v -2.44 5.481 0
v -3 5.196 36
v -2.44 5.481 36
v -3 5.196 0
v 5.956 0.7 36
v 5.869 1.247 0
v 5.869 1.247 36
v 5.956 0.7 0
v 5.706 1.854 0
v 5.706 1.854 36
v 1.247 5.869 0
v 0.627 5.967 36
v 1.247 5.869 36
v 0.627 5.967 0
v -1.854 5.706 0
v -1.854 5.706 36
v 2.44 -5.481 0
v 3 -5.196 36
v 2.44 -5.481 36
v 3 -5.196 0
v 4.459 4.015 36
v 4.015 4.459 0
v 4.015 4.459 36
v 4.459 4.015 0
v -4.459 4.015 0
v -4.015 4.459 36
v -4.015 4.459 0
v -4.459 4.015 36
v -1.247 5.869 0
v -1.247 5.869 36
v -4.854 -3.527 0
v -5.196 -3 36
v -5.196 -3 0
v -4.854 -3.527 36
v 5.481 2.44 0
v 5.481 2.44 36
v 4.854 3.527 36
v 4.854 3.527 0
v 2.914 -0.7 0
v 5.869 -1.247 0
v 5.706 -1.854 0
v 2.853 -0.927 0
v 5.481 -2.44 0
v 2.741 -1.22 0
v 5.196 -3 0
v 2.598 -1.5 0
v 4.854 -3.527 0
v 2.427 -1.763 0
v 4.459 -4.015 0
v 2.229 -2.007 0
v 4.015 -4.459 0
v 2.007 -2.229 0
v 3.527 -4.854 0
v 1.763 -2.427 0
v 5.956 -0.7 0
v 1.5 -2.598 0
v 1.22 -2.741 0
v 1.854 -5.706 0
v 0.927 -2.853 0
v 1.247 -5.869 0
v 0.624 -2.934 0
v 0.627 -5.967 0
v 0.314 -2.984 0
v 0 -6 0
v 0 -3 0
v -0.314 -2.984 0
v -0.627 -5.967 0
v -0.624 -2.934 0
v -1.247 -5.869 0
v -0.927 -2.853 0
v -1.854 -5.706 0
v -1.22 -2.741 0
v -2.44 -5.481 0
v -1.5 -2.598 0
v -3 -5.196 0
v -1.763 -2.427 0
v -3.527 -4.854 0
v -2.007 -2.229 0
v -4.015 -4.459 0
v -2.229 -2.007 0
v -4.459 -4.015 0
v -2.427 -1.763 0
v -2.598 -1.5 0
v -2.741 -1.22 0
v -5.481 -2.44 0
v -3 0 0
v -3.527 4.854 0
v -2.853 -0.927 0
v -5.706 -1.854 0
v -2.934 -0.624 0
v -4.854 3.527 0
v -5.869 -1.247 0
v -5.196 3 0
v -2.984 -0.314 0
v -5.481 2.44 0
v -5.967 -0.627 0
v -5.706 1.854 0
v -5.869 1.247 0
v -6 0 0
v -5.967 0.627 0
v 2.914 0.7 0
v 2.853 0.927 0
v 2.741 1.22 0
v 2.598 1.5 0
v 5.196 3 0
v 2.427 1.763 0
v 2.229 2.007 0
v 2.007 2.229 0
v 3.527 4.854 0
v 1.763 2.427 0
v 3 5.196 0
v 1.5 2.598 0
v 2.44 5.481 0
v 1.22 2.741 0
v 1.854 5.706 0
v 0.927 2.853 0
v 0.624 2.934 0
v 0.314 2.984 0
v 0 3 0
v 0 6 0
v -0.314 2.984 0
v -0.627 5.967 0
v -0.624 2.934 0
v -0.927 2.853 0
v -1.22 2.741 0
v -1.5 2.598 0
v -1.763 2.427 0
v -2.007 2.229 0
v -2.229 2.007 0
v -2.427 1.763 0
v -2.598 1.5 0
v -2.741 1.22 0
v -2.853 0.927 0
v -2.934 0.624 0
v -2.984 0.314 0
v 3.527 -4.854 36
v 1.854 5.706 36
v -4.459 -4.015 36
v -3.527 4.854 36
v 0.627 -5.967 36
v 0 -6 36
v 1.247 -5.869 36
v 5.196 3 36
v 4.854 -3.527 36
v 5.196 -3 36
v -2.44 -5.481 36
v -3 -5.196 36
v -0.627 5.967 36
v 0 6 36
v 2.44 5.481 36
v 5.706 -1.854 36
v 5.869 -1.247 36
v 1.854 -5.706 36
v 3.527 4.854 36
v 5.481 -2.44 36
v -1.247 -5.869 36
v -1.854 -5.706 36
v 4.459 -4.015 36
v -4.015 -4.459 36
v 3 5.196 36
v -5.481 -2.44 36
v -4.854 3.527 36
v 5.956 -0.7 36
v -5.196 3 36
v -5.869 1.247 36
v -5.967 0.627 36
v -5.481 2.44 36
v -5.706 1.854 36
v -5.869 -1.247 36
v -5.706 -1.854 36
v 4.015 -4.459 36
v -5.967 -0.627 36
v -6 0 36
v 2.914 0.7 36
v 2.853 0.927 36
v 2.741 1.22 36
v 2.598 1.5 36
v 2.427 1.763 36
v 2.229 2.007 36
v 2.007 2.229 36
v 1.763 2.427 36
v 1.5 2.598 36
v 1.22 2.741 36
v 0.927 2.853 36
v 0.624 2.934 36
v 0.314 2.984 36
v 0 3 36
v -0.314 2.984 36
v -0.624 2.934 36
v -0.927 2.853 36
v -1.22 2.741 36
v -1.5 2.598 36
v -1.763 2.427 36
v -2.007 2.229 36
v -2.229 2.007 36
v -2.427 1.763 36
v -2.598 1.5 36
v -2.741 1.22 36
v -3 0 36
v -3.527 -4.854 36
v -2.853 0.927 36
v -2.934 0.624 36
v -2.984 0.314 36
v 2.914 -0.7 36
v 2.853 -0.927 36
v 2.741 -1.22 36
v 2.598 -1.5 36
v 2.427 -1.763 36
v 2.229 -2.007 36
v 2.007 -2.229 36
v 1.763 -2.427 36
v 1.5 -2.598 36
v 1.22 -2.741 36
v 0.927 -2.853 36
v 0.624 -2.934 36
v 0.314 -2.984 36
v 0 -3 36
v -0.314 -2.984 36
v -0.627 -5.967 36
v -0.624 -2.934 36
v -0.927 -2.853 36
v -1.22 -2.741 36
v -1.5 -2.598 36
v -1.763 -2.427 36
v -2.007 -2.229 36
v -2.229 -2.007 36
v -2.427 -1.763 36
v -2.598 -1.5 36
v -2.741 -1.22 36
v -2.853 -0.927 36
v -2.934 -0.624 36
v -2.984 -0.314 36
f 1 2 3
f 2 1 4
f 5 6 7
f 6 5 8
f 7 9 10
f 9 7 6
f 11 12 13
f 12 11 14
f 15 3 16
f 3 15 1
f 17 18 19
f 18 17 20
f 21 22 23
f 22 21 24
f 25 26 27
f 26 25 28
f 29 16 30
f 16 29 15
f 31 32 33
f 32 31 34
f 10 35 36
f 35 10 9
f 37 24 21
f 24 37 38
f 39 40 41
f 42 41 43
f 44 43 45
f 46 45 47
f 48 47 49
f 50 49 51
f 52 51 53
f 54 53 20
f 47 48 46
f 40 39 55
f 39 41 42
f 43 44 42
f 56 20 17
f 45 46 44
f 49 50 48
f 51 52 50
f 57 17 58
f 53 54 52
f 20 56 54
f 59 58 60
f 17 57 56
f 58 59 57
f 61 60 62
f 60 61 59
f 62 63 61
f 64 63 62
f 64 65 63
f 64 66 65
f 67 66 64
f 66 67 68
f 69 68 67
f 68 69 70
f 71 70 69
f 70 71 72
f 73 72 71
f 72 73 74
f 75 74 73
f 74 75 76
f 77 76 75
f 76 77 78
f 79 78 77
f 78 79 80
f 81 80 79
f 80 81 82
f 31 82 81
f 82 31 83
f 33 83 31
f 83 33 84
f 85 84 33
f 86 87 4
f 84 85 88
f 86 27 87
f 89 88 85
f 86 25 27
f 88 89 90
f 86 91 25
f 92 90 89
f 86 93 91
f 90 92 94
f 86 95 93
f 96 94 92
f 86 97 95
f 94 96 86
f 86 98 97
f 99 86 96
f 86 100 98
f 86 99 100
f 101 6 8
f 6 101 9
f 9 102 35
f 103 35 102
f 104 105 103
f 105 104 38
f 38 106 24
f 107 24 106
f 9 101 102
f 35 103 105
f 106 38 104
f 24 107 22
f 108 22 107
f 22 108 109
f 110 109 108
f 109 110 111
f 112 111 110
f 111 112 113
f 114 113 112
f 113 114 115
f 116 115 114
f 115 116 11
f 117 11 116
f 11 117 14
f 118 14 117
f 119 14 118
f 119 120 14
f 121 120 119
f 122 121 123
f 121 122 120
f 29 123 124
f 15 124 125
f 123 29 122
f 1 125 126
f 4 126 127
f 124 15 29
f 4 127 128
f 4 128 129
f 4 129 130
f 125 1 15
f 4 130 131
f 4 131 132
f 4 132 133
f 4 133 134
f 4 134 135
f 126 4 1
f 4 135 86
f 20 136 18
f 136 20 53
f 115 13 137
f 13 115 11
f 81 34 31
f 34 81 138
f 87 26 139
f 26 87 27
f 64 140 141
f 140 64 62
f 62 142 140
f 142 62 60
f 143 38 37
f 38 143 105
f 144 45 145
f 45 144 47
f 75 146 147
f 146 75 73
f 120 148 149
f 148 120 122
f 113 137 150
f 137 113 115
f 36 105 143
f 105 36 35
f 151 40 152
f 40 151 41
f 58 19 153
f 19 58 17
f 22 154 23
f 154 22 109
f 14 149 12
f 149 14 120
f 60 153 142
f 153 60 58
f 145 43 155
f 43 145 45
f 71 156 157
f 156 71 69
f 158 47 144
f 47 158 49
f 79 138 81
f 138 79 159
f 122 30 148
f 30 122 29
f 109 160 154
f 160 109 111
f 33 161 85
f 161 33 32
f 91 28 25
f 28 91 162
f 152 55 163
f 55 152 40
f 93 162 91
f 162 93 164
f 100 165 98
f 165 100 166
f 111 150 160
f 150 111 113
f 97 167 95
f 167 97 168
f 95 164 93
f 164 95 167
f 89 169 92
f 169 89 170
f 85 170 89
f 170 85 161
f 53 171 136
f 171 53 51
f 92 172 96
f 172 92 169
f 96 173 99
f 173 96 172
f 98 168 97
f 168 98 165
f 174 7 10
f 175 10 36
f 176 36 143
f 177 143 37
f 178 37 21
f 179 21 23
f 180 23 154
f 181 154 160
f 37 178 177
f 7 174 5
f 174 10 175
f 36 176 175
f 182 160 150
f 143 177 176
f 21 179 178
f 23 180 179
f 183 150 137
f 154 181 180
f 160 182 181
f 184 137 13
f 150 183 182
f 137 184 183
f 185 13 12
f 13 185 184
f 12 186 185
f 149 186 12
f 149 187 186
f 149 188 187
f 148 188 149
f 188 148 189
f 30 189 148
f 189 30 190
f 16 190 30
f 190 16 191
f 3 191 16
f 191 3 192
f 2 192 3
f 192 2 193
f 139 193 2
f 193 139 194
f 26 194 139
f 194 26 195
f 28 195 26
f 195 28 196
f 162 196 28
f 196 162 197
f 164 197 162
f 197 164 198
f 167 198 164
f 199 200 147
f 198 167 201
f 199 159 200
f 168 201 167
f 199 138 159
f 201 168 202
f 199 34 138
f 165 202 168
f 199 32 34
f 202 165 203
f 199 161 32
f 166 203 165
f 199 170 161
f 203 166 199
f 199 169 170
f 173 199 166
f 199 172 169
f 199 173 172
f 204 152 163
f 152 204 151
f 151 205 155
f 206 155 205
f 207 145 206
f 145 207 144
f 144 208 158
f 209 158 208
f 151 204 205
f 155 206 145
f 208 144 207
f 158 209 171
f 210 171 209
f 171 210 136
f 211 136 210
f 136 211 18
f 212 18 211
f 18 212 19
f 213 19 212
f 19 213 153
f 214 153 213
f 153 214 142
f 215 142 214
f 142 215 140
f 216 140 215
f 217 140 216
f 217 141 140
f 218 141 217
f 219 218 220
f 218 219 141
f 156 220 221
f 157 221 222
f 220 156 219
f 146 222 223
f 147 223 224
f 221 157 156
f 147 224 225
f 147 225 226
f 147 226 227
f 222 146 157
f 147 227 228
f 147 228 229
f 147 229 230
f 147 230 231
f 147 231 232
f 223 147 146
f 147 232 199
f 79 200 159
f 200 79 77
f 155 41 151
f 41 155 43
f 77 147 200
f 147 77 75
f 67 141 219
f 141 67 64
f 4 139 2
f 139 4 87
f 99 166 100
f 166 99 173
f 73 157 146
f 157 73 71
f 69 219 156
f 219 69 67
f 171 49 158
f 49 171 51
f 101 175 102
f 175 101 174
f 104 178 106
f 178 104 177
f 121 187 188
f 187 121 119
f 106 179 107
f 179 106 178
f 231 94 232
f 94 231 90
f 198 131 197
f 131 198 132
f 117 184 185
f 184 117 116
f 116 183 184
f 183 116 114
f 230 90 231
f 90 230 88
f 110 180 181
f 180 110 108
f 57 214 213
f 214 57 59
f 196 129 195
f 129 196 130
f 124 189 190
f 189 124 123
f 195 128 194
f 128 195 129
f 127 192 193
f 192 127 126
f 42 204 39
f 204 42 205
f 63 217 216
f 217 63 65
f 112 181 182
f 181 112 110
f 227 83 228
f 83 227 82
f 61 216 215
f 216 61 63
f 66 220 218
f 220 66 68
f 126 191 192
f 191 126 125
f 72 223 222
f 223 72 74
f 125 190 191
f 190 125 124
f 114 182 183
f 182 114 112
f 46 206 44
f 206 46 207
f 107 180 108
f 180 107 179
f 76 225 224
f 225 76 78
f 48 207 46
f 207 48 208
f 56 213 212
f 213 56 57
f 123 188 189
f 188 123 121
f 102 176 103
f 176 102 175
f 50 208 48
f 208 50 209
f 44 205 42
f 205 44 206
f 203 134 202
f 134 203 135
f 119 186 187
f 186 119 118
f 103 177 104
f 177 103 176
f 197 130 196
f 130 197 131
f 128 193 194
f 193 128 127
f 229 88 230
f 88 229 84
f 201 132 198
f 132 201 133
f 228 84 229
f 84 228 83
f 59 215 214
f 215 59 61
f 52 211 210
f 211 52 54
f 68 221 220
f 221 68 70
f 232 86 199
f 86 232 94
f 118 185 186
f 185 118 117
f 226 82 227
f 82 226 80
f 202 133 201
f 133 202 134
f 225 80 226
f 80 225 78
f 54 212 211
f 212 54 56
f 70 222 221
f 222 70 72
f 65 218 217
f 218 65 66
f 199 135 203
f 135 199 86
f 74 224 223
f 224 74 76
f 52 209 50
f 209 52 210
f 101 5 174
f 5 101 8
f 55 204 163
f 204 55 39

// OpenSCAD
// Slotted roll pin.
$fn = 60;
eps = 0.02;
inner_d = 6;
outer_d = 12;
length = 36;
slot = 1.4;
difference() {
    cylinder(d=outer_d,h=length);
    translate([0,0,-eps]) cylinder(d=inner_d,h=length+2*eps);
    translate([0,-slot/2,-eps]) cube([outer_d/2+eps,slot,length+2*eps]);
}
